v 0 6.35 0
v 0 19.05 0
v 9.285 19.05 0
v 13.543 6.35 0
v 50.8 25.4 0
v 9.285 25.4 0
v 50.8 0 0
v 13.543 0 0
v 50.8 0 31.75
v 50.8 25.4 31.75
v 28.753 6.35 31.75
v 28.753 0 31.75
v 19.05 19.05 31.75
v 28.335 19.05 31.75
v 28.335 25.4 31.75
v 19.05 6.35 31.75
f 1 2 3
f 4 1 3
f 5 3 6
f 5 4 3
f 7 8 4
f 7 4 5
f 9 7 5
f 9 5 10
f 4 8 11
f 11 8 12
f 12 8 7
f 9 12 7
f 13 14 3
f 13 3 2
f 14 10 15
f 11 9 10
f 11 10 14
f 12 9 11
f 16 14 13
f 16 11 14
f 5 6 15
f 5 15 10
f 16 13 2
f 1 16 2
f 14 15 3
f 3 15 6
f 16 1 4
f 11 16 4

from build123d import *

# Parameters (mm, degrees)
F1_DEPTH = 25.4
F3_DEPTH = 6.35
F5_DEPTH = 25.401
F7_DEPTH = 6.35


with BuildPart() as f1:
    # F0 (on Front) → F1 (new body)
    with BuildSketch(Plane.XZ):
        Polygon((21.227144, 31.75), (0, 31.75), (0, 0), (37.555713, 0), align=None)
        Polygon((34.47143, 31.75), (21.227144, 31.75), (37.555713, 0), (50.8, 0), align=None)
        Polygon((50.8, 31.75), (34.47143, 31.75), (50.8, 0), align=None)
    extrude(amount=-F1_DEPTH)

    # F2 (on Front) → F3 (cut, symmetric)
    with BuildSketch(Plane.XZ):
        Polygon((13.543111, 0), (28.911175, 32.08084), (0, 32.08084), (0, 0), align=None)
    extrude(amount=F3_DEPTH, both=True, mode=Mode.SUBTRACT)

    # F4 (on face) → F5 (cut, through all)
    with BuildSketch(Plane(origin=(0, 25.4, 0), x_dir=(-1, 0, 0), z_dir=(0, 1, 0))):
        Polygon((0, 31.75), (-19.05, 31.75), (0, 0), align=None)
    extrude(amount=-F5_DEPTH, mode=Mode.SUBTRACT)

    # F6 (on face) → F7 (cut, symmetric)
    with BuildSketch(Plane(origin=(0, 25.4, 0), x_dir=(-1, 0, 0), z_dir=(0, 1, 0))):
        Polygon((-19.05, 31.75), (-28.334875, 31.75), (-9.284875, 0), (0, 0), align=None)
    extrude(amount=F7_DEPTH, both=True, mode=Mode.SUBTRACT)


solid = f1.part
